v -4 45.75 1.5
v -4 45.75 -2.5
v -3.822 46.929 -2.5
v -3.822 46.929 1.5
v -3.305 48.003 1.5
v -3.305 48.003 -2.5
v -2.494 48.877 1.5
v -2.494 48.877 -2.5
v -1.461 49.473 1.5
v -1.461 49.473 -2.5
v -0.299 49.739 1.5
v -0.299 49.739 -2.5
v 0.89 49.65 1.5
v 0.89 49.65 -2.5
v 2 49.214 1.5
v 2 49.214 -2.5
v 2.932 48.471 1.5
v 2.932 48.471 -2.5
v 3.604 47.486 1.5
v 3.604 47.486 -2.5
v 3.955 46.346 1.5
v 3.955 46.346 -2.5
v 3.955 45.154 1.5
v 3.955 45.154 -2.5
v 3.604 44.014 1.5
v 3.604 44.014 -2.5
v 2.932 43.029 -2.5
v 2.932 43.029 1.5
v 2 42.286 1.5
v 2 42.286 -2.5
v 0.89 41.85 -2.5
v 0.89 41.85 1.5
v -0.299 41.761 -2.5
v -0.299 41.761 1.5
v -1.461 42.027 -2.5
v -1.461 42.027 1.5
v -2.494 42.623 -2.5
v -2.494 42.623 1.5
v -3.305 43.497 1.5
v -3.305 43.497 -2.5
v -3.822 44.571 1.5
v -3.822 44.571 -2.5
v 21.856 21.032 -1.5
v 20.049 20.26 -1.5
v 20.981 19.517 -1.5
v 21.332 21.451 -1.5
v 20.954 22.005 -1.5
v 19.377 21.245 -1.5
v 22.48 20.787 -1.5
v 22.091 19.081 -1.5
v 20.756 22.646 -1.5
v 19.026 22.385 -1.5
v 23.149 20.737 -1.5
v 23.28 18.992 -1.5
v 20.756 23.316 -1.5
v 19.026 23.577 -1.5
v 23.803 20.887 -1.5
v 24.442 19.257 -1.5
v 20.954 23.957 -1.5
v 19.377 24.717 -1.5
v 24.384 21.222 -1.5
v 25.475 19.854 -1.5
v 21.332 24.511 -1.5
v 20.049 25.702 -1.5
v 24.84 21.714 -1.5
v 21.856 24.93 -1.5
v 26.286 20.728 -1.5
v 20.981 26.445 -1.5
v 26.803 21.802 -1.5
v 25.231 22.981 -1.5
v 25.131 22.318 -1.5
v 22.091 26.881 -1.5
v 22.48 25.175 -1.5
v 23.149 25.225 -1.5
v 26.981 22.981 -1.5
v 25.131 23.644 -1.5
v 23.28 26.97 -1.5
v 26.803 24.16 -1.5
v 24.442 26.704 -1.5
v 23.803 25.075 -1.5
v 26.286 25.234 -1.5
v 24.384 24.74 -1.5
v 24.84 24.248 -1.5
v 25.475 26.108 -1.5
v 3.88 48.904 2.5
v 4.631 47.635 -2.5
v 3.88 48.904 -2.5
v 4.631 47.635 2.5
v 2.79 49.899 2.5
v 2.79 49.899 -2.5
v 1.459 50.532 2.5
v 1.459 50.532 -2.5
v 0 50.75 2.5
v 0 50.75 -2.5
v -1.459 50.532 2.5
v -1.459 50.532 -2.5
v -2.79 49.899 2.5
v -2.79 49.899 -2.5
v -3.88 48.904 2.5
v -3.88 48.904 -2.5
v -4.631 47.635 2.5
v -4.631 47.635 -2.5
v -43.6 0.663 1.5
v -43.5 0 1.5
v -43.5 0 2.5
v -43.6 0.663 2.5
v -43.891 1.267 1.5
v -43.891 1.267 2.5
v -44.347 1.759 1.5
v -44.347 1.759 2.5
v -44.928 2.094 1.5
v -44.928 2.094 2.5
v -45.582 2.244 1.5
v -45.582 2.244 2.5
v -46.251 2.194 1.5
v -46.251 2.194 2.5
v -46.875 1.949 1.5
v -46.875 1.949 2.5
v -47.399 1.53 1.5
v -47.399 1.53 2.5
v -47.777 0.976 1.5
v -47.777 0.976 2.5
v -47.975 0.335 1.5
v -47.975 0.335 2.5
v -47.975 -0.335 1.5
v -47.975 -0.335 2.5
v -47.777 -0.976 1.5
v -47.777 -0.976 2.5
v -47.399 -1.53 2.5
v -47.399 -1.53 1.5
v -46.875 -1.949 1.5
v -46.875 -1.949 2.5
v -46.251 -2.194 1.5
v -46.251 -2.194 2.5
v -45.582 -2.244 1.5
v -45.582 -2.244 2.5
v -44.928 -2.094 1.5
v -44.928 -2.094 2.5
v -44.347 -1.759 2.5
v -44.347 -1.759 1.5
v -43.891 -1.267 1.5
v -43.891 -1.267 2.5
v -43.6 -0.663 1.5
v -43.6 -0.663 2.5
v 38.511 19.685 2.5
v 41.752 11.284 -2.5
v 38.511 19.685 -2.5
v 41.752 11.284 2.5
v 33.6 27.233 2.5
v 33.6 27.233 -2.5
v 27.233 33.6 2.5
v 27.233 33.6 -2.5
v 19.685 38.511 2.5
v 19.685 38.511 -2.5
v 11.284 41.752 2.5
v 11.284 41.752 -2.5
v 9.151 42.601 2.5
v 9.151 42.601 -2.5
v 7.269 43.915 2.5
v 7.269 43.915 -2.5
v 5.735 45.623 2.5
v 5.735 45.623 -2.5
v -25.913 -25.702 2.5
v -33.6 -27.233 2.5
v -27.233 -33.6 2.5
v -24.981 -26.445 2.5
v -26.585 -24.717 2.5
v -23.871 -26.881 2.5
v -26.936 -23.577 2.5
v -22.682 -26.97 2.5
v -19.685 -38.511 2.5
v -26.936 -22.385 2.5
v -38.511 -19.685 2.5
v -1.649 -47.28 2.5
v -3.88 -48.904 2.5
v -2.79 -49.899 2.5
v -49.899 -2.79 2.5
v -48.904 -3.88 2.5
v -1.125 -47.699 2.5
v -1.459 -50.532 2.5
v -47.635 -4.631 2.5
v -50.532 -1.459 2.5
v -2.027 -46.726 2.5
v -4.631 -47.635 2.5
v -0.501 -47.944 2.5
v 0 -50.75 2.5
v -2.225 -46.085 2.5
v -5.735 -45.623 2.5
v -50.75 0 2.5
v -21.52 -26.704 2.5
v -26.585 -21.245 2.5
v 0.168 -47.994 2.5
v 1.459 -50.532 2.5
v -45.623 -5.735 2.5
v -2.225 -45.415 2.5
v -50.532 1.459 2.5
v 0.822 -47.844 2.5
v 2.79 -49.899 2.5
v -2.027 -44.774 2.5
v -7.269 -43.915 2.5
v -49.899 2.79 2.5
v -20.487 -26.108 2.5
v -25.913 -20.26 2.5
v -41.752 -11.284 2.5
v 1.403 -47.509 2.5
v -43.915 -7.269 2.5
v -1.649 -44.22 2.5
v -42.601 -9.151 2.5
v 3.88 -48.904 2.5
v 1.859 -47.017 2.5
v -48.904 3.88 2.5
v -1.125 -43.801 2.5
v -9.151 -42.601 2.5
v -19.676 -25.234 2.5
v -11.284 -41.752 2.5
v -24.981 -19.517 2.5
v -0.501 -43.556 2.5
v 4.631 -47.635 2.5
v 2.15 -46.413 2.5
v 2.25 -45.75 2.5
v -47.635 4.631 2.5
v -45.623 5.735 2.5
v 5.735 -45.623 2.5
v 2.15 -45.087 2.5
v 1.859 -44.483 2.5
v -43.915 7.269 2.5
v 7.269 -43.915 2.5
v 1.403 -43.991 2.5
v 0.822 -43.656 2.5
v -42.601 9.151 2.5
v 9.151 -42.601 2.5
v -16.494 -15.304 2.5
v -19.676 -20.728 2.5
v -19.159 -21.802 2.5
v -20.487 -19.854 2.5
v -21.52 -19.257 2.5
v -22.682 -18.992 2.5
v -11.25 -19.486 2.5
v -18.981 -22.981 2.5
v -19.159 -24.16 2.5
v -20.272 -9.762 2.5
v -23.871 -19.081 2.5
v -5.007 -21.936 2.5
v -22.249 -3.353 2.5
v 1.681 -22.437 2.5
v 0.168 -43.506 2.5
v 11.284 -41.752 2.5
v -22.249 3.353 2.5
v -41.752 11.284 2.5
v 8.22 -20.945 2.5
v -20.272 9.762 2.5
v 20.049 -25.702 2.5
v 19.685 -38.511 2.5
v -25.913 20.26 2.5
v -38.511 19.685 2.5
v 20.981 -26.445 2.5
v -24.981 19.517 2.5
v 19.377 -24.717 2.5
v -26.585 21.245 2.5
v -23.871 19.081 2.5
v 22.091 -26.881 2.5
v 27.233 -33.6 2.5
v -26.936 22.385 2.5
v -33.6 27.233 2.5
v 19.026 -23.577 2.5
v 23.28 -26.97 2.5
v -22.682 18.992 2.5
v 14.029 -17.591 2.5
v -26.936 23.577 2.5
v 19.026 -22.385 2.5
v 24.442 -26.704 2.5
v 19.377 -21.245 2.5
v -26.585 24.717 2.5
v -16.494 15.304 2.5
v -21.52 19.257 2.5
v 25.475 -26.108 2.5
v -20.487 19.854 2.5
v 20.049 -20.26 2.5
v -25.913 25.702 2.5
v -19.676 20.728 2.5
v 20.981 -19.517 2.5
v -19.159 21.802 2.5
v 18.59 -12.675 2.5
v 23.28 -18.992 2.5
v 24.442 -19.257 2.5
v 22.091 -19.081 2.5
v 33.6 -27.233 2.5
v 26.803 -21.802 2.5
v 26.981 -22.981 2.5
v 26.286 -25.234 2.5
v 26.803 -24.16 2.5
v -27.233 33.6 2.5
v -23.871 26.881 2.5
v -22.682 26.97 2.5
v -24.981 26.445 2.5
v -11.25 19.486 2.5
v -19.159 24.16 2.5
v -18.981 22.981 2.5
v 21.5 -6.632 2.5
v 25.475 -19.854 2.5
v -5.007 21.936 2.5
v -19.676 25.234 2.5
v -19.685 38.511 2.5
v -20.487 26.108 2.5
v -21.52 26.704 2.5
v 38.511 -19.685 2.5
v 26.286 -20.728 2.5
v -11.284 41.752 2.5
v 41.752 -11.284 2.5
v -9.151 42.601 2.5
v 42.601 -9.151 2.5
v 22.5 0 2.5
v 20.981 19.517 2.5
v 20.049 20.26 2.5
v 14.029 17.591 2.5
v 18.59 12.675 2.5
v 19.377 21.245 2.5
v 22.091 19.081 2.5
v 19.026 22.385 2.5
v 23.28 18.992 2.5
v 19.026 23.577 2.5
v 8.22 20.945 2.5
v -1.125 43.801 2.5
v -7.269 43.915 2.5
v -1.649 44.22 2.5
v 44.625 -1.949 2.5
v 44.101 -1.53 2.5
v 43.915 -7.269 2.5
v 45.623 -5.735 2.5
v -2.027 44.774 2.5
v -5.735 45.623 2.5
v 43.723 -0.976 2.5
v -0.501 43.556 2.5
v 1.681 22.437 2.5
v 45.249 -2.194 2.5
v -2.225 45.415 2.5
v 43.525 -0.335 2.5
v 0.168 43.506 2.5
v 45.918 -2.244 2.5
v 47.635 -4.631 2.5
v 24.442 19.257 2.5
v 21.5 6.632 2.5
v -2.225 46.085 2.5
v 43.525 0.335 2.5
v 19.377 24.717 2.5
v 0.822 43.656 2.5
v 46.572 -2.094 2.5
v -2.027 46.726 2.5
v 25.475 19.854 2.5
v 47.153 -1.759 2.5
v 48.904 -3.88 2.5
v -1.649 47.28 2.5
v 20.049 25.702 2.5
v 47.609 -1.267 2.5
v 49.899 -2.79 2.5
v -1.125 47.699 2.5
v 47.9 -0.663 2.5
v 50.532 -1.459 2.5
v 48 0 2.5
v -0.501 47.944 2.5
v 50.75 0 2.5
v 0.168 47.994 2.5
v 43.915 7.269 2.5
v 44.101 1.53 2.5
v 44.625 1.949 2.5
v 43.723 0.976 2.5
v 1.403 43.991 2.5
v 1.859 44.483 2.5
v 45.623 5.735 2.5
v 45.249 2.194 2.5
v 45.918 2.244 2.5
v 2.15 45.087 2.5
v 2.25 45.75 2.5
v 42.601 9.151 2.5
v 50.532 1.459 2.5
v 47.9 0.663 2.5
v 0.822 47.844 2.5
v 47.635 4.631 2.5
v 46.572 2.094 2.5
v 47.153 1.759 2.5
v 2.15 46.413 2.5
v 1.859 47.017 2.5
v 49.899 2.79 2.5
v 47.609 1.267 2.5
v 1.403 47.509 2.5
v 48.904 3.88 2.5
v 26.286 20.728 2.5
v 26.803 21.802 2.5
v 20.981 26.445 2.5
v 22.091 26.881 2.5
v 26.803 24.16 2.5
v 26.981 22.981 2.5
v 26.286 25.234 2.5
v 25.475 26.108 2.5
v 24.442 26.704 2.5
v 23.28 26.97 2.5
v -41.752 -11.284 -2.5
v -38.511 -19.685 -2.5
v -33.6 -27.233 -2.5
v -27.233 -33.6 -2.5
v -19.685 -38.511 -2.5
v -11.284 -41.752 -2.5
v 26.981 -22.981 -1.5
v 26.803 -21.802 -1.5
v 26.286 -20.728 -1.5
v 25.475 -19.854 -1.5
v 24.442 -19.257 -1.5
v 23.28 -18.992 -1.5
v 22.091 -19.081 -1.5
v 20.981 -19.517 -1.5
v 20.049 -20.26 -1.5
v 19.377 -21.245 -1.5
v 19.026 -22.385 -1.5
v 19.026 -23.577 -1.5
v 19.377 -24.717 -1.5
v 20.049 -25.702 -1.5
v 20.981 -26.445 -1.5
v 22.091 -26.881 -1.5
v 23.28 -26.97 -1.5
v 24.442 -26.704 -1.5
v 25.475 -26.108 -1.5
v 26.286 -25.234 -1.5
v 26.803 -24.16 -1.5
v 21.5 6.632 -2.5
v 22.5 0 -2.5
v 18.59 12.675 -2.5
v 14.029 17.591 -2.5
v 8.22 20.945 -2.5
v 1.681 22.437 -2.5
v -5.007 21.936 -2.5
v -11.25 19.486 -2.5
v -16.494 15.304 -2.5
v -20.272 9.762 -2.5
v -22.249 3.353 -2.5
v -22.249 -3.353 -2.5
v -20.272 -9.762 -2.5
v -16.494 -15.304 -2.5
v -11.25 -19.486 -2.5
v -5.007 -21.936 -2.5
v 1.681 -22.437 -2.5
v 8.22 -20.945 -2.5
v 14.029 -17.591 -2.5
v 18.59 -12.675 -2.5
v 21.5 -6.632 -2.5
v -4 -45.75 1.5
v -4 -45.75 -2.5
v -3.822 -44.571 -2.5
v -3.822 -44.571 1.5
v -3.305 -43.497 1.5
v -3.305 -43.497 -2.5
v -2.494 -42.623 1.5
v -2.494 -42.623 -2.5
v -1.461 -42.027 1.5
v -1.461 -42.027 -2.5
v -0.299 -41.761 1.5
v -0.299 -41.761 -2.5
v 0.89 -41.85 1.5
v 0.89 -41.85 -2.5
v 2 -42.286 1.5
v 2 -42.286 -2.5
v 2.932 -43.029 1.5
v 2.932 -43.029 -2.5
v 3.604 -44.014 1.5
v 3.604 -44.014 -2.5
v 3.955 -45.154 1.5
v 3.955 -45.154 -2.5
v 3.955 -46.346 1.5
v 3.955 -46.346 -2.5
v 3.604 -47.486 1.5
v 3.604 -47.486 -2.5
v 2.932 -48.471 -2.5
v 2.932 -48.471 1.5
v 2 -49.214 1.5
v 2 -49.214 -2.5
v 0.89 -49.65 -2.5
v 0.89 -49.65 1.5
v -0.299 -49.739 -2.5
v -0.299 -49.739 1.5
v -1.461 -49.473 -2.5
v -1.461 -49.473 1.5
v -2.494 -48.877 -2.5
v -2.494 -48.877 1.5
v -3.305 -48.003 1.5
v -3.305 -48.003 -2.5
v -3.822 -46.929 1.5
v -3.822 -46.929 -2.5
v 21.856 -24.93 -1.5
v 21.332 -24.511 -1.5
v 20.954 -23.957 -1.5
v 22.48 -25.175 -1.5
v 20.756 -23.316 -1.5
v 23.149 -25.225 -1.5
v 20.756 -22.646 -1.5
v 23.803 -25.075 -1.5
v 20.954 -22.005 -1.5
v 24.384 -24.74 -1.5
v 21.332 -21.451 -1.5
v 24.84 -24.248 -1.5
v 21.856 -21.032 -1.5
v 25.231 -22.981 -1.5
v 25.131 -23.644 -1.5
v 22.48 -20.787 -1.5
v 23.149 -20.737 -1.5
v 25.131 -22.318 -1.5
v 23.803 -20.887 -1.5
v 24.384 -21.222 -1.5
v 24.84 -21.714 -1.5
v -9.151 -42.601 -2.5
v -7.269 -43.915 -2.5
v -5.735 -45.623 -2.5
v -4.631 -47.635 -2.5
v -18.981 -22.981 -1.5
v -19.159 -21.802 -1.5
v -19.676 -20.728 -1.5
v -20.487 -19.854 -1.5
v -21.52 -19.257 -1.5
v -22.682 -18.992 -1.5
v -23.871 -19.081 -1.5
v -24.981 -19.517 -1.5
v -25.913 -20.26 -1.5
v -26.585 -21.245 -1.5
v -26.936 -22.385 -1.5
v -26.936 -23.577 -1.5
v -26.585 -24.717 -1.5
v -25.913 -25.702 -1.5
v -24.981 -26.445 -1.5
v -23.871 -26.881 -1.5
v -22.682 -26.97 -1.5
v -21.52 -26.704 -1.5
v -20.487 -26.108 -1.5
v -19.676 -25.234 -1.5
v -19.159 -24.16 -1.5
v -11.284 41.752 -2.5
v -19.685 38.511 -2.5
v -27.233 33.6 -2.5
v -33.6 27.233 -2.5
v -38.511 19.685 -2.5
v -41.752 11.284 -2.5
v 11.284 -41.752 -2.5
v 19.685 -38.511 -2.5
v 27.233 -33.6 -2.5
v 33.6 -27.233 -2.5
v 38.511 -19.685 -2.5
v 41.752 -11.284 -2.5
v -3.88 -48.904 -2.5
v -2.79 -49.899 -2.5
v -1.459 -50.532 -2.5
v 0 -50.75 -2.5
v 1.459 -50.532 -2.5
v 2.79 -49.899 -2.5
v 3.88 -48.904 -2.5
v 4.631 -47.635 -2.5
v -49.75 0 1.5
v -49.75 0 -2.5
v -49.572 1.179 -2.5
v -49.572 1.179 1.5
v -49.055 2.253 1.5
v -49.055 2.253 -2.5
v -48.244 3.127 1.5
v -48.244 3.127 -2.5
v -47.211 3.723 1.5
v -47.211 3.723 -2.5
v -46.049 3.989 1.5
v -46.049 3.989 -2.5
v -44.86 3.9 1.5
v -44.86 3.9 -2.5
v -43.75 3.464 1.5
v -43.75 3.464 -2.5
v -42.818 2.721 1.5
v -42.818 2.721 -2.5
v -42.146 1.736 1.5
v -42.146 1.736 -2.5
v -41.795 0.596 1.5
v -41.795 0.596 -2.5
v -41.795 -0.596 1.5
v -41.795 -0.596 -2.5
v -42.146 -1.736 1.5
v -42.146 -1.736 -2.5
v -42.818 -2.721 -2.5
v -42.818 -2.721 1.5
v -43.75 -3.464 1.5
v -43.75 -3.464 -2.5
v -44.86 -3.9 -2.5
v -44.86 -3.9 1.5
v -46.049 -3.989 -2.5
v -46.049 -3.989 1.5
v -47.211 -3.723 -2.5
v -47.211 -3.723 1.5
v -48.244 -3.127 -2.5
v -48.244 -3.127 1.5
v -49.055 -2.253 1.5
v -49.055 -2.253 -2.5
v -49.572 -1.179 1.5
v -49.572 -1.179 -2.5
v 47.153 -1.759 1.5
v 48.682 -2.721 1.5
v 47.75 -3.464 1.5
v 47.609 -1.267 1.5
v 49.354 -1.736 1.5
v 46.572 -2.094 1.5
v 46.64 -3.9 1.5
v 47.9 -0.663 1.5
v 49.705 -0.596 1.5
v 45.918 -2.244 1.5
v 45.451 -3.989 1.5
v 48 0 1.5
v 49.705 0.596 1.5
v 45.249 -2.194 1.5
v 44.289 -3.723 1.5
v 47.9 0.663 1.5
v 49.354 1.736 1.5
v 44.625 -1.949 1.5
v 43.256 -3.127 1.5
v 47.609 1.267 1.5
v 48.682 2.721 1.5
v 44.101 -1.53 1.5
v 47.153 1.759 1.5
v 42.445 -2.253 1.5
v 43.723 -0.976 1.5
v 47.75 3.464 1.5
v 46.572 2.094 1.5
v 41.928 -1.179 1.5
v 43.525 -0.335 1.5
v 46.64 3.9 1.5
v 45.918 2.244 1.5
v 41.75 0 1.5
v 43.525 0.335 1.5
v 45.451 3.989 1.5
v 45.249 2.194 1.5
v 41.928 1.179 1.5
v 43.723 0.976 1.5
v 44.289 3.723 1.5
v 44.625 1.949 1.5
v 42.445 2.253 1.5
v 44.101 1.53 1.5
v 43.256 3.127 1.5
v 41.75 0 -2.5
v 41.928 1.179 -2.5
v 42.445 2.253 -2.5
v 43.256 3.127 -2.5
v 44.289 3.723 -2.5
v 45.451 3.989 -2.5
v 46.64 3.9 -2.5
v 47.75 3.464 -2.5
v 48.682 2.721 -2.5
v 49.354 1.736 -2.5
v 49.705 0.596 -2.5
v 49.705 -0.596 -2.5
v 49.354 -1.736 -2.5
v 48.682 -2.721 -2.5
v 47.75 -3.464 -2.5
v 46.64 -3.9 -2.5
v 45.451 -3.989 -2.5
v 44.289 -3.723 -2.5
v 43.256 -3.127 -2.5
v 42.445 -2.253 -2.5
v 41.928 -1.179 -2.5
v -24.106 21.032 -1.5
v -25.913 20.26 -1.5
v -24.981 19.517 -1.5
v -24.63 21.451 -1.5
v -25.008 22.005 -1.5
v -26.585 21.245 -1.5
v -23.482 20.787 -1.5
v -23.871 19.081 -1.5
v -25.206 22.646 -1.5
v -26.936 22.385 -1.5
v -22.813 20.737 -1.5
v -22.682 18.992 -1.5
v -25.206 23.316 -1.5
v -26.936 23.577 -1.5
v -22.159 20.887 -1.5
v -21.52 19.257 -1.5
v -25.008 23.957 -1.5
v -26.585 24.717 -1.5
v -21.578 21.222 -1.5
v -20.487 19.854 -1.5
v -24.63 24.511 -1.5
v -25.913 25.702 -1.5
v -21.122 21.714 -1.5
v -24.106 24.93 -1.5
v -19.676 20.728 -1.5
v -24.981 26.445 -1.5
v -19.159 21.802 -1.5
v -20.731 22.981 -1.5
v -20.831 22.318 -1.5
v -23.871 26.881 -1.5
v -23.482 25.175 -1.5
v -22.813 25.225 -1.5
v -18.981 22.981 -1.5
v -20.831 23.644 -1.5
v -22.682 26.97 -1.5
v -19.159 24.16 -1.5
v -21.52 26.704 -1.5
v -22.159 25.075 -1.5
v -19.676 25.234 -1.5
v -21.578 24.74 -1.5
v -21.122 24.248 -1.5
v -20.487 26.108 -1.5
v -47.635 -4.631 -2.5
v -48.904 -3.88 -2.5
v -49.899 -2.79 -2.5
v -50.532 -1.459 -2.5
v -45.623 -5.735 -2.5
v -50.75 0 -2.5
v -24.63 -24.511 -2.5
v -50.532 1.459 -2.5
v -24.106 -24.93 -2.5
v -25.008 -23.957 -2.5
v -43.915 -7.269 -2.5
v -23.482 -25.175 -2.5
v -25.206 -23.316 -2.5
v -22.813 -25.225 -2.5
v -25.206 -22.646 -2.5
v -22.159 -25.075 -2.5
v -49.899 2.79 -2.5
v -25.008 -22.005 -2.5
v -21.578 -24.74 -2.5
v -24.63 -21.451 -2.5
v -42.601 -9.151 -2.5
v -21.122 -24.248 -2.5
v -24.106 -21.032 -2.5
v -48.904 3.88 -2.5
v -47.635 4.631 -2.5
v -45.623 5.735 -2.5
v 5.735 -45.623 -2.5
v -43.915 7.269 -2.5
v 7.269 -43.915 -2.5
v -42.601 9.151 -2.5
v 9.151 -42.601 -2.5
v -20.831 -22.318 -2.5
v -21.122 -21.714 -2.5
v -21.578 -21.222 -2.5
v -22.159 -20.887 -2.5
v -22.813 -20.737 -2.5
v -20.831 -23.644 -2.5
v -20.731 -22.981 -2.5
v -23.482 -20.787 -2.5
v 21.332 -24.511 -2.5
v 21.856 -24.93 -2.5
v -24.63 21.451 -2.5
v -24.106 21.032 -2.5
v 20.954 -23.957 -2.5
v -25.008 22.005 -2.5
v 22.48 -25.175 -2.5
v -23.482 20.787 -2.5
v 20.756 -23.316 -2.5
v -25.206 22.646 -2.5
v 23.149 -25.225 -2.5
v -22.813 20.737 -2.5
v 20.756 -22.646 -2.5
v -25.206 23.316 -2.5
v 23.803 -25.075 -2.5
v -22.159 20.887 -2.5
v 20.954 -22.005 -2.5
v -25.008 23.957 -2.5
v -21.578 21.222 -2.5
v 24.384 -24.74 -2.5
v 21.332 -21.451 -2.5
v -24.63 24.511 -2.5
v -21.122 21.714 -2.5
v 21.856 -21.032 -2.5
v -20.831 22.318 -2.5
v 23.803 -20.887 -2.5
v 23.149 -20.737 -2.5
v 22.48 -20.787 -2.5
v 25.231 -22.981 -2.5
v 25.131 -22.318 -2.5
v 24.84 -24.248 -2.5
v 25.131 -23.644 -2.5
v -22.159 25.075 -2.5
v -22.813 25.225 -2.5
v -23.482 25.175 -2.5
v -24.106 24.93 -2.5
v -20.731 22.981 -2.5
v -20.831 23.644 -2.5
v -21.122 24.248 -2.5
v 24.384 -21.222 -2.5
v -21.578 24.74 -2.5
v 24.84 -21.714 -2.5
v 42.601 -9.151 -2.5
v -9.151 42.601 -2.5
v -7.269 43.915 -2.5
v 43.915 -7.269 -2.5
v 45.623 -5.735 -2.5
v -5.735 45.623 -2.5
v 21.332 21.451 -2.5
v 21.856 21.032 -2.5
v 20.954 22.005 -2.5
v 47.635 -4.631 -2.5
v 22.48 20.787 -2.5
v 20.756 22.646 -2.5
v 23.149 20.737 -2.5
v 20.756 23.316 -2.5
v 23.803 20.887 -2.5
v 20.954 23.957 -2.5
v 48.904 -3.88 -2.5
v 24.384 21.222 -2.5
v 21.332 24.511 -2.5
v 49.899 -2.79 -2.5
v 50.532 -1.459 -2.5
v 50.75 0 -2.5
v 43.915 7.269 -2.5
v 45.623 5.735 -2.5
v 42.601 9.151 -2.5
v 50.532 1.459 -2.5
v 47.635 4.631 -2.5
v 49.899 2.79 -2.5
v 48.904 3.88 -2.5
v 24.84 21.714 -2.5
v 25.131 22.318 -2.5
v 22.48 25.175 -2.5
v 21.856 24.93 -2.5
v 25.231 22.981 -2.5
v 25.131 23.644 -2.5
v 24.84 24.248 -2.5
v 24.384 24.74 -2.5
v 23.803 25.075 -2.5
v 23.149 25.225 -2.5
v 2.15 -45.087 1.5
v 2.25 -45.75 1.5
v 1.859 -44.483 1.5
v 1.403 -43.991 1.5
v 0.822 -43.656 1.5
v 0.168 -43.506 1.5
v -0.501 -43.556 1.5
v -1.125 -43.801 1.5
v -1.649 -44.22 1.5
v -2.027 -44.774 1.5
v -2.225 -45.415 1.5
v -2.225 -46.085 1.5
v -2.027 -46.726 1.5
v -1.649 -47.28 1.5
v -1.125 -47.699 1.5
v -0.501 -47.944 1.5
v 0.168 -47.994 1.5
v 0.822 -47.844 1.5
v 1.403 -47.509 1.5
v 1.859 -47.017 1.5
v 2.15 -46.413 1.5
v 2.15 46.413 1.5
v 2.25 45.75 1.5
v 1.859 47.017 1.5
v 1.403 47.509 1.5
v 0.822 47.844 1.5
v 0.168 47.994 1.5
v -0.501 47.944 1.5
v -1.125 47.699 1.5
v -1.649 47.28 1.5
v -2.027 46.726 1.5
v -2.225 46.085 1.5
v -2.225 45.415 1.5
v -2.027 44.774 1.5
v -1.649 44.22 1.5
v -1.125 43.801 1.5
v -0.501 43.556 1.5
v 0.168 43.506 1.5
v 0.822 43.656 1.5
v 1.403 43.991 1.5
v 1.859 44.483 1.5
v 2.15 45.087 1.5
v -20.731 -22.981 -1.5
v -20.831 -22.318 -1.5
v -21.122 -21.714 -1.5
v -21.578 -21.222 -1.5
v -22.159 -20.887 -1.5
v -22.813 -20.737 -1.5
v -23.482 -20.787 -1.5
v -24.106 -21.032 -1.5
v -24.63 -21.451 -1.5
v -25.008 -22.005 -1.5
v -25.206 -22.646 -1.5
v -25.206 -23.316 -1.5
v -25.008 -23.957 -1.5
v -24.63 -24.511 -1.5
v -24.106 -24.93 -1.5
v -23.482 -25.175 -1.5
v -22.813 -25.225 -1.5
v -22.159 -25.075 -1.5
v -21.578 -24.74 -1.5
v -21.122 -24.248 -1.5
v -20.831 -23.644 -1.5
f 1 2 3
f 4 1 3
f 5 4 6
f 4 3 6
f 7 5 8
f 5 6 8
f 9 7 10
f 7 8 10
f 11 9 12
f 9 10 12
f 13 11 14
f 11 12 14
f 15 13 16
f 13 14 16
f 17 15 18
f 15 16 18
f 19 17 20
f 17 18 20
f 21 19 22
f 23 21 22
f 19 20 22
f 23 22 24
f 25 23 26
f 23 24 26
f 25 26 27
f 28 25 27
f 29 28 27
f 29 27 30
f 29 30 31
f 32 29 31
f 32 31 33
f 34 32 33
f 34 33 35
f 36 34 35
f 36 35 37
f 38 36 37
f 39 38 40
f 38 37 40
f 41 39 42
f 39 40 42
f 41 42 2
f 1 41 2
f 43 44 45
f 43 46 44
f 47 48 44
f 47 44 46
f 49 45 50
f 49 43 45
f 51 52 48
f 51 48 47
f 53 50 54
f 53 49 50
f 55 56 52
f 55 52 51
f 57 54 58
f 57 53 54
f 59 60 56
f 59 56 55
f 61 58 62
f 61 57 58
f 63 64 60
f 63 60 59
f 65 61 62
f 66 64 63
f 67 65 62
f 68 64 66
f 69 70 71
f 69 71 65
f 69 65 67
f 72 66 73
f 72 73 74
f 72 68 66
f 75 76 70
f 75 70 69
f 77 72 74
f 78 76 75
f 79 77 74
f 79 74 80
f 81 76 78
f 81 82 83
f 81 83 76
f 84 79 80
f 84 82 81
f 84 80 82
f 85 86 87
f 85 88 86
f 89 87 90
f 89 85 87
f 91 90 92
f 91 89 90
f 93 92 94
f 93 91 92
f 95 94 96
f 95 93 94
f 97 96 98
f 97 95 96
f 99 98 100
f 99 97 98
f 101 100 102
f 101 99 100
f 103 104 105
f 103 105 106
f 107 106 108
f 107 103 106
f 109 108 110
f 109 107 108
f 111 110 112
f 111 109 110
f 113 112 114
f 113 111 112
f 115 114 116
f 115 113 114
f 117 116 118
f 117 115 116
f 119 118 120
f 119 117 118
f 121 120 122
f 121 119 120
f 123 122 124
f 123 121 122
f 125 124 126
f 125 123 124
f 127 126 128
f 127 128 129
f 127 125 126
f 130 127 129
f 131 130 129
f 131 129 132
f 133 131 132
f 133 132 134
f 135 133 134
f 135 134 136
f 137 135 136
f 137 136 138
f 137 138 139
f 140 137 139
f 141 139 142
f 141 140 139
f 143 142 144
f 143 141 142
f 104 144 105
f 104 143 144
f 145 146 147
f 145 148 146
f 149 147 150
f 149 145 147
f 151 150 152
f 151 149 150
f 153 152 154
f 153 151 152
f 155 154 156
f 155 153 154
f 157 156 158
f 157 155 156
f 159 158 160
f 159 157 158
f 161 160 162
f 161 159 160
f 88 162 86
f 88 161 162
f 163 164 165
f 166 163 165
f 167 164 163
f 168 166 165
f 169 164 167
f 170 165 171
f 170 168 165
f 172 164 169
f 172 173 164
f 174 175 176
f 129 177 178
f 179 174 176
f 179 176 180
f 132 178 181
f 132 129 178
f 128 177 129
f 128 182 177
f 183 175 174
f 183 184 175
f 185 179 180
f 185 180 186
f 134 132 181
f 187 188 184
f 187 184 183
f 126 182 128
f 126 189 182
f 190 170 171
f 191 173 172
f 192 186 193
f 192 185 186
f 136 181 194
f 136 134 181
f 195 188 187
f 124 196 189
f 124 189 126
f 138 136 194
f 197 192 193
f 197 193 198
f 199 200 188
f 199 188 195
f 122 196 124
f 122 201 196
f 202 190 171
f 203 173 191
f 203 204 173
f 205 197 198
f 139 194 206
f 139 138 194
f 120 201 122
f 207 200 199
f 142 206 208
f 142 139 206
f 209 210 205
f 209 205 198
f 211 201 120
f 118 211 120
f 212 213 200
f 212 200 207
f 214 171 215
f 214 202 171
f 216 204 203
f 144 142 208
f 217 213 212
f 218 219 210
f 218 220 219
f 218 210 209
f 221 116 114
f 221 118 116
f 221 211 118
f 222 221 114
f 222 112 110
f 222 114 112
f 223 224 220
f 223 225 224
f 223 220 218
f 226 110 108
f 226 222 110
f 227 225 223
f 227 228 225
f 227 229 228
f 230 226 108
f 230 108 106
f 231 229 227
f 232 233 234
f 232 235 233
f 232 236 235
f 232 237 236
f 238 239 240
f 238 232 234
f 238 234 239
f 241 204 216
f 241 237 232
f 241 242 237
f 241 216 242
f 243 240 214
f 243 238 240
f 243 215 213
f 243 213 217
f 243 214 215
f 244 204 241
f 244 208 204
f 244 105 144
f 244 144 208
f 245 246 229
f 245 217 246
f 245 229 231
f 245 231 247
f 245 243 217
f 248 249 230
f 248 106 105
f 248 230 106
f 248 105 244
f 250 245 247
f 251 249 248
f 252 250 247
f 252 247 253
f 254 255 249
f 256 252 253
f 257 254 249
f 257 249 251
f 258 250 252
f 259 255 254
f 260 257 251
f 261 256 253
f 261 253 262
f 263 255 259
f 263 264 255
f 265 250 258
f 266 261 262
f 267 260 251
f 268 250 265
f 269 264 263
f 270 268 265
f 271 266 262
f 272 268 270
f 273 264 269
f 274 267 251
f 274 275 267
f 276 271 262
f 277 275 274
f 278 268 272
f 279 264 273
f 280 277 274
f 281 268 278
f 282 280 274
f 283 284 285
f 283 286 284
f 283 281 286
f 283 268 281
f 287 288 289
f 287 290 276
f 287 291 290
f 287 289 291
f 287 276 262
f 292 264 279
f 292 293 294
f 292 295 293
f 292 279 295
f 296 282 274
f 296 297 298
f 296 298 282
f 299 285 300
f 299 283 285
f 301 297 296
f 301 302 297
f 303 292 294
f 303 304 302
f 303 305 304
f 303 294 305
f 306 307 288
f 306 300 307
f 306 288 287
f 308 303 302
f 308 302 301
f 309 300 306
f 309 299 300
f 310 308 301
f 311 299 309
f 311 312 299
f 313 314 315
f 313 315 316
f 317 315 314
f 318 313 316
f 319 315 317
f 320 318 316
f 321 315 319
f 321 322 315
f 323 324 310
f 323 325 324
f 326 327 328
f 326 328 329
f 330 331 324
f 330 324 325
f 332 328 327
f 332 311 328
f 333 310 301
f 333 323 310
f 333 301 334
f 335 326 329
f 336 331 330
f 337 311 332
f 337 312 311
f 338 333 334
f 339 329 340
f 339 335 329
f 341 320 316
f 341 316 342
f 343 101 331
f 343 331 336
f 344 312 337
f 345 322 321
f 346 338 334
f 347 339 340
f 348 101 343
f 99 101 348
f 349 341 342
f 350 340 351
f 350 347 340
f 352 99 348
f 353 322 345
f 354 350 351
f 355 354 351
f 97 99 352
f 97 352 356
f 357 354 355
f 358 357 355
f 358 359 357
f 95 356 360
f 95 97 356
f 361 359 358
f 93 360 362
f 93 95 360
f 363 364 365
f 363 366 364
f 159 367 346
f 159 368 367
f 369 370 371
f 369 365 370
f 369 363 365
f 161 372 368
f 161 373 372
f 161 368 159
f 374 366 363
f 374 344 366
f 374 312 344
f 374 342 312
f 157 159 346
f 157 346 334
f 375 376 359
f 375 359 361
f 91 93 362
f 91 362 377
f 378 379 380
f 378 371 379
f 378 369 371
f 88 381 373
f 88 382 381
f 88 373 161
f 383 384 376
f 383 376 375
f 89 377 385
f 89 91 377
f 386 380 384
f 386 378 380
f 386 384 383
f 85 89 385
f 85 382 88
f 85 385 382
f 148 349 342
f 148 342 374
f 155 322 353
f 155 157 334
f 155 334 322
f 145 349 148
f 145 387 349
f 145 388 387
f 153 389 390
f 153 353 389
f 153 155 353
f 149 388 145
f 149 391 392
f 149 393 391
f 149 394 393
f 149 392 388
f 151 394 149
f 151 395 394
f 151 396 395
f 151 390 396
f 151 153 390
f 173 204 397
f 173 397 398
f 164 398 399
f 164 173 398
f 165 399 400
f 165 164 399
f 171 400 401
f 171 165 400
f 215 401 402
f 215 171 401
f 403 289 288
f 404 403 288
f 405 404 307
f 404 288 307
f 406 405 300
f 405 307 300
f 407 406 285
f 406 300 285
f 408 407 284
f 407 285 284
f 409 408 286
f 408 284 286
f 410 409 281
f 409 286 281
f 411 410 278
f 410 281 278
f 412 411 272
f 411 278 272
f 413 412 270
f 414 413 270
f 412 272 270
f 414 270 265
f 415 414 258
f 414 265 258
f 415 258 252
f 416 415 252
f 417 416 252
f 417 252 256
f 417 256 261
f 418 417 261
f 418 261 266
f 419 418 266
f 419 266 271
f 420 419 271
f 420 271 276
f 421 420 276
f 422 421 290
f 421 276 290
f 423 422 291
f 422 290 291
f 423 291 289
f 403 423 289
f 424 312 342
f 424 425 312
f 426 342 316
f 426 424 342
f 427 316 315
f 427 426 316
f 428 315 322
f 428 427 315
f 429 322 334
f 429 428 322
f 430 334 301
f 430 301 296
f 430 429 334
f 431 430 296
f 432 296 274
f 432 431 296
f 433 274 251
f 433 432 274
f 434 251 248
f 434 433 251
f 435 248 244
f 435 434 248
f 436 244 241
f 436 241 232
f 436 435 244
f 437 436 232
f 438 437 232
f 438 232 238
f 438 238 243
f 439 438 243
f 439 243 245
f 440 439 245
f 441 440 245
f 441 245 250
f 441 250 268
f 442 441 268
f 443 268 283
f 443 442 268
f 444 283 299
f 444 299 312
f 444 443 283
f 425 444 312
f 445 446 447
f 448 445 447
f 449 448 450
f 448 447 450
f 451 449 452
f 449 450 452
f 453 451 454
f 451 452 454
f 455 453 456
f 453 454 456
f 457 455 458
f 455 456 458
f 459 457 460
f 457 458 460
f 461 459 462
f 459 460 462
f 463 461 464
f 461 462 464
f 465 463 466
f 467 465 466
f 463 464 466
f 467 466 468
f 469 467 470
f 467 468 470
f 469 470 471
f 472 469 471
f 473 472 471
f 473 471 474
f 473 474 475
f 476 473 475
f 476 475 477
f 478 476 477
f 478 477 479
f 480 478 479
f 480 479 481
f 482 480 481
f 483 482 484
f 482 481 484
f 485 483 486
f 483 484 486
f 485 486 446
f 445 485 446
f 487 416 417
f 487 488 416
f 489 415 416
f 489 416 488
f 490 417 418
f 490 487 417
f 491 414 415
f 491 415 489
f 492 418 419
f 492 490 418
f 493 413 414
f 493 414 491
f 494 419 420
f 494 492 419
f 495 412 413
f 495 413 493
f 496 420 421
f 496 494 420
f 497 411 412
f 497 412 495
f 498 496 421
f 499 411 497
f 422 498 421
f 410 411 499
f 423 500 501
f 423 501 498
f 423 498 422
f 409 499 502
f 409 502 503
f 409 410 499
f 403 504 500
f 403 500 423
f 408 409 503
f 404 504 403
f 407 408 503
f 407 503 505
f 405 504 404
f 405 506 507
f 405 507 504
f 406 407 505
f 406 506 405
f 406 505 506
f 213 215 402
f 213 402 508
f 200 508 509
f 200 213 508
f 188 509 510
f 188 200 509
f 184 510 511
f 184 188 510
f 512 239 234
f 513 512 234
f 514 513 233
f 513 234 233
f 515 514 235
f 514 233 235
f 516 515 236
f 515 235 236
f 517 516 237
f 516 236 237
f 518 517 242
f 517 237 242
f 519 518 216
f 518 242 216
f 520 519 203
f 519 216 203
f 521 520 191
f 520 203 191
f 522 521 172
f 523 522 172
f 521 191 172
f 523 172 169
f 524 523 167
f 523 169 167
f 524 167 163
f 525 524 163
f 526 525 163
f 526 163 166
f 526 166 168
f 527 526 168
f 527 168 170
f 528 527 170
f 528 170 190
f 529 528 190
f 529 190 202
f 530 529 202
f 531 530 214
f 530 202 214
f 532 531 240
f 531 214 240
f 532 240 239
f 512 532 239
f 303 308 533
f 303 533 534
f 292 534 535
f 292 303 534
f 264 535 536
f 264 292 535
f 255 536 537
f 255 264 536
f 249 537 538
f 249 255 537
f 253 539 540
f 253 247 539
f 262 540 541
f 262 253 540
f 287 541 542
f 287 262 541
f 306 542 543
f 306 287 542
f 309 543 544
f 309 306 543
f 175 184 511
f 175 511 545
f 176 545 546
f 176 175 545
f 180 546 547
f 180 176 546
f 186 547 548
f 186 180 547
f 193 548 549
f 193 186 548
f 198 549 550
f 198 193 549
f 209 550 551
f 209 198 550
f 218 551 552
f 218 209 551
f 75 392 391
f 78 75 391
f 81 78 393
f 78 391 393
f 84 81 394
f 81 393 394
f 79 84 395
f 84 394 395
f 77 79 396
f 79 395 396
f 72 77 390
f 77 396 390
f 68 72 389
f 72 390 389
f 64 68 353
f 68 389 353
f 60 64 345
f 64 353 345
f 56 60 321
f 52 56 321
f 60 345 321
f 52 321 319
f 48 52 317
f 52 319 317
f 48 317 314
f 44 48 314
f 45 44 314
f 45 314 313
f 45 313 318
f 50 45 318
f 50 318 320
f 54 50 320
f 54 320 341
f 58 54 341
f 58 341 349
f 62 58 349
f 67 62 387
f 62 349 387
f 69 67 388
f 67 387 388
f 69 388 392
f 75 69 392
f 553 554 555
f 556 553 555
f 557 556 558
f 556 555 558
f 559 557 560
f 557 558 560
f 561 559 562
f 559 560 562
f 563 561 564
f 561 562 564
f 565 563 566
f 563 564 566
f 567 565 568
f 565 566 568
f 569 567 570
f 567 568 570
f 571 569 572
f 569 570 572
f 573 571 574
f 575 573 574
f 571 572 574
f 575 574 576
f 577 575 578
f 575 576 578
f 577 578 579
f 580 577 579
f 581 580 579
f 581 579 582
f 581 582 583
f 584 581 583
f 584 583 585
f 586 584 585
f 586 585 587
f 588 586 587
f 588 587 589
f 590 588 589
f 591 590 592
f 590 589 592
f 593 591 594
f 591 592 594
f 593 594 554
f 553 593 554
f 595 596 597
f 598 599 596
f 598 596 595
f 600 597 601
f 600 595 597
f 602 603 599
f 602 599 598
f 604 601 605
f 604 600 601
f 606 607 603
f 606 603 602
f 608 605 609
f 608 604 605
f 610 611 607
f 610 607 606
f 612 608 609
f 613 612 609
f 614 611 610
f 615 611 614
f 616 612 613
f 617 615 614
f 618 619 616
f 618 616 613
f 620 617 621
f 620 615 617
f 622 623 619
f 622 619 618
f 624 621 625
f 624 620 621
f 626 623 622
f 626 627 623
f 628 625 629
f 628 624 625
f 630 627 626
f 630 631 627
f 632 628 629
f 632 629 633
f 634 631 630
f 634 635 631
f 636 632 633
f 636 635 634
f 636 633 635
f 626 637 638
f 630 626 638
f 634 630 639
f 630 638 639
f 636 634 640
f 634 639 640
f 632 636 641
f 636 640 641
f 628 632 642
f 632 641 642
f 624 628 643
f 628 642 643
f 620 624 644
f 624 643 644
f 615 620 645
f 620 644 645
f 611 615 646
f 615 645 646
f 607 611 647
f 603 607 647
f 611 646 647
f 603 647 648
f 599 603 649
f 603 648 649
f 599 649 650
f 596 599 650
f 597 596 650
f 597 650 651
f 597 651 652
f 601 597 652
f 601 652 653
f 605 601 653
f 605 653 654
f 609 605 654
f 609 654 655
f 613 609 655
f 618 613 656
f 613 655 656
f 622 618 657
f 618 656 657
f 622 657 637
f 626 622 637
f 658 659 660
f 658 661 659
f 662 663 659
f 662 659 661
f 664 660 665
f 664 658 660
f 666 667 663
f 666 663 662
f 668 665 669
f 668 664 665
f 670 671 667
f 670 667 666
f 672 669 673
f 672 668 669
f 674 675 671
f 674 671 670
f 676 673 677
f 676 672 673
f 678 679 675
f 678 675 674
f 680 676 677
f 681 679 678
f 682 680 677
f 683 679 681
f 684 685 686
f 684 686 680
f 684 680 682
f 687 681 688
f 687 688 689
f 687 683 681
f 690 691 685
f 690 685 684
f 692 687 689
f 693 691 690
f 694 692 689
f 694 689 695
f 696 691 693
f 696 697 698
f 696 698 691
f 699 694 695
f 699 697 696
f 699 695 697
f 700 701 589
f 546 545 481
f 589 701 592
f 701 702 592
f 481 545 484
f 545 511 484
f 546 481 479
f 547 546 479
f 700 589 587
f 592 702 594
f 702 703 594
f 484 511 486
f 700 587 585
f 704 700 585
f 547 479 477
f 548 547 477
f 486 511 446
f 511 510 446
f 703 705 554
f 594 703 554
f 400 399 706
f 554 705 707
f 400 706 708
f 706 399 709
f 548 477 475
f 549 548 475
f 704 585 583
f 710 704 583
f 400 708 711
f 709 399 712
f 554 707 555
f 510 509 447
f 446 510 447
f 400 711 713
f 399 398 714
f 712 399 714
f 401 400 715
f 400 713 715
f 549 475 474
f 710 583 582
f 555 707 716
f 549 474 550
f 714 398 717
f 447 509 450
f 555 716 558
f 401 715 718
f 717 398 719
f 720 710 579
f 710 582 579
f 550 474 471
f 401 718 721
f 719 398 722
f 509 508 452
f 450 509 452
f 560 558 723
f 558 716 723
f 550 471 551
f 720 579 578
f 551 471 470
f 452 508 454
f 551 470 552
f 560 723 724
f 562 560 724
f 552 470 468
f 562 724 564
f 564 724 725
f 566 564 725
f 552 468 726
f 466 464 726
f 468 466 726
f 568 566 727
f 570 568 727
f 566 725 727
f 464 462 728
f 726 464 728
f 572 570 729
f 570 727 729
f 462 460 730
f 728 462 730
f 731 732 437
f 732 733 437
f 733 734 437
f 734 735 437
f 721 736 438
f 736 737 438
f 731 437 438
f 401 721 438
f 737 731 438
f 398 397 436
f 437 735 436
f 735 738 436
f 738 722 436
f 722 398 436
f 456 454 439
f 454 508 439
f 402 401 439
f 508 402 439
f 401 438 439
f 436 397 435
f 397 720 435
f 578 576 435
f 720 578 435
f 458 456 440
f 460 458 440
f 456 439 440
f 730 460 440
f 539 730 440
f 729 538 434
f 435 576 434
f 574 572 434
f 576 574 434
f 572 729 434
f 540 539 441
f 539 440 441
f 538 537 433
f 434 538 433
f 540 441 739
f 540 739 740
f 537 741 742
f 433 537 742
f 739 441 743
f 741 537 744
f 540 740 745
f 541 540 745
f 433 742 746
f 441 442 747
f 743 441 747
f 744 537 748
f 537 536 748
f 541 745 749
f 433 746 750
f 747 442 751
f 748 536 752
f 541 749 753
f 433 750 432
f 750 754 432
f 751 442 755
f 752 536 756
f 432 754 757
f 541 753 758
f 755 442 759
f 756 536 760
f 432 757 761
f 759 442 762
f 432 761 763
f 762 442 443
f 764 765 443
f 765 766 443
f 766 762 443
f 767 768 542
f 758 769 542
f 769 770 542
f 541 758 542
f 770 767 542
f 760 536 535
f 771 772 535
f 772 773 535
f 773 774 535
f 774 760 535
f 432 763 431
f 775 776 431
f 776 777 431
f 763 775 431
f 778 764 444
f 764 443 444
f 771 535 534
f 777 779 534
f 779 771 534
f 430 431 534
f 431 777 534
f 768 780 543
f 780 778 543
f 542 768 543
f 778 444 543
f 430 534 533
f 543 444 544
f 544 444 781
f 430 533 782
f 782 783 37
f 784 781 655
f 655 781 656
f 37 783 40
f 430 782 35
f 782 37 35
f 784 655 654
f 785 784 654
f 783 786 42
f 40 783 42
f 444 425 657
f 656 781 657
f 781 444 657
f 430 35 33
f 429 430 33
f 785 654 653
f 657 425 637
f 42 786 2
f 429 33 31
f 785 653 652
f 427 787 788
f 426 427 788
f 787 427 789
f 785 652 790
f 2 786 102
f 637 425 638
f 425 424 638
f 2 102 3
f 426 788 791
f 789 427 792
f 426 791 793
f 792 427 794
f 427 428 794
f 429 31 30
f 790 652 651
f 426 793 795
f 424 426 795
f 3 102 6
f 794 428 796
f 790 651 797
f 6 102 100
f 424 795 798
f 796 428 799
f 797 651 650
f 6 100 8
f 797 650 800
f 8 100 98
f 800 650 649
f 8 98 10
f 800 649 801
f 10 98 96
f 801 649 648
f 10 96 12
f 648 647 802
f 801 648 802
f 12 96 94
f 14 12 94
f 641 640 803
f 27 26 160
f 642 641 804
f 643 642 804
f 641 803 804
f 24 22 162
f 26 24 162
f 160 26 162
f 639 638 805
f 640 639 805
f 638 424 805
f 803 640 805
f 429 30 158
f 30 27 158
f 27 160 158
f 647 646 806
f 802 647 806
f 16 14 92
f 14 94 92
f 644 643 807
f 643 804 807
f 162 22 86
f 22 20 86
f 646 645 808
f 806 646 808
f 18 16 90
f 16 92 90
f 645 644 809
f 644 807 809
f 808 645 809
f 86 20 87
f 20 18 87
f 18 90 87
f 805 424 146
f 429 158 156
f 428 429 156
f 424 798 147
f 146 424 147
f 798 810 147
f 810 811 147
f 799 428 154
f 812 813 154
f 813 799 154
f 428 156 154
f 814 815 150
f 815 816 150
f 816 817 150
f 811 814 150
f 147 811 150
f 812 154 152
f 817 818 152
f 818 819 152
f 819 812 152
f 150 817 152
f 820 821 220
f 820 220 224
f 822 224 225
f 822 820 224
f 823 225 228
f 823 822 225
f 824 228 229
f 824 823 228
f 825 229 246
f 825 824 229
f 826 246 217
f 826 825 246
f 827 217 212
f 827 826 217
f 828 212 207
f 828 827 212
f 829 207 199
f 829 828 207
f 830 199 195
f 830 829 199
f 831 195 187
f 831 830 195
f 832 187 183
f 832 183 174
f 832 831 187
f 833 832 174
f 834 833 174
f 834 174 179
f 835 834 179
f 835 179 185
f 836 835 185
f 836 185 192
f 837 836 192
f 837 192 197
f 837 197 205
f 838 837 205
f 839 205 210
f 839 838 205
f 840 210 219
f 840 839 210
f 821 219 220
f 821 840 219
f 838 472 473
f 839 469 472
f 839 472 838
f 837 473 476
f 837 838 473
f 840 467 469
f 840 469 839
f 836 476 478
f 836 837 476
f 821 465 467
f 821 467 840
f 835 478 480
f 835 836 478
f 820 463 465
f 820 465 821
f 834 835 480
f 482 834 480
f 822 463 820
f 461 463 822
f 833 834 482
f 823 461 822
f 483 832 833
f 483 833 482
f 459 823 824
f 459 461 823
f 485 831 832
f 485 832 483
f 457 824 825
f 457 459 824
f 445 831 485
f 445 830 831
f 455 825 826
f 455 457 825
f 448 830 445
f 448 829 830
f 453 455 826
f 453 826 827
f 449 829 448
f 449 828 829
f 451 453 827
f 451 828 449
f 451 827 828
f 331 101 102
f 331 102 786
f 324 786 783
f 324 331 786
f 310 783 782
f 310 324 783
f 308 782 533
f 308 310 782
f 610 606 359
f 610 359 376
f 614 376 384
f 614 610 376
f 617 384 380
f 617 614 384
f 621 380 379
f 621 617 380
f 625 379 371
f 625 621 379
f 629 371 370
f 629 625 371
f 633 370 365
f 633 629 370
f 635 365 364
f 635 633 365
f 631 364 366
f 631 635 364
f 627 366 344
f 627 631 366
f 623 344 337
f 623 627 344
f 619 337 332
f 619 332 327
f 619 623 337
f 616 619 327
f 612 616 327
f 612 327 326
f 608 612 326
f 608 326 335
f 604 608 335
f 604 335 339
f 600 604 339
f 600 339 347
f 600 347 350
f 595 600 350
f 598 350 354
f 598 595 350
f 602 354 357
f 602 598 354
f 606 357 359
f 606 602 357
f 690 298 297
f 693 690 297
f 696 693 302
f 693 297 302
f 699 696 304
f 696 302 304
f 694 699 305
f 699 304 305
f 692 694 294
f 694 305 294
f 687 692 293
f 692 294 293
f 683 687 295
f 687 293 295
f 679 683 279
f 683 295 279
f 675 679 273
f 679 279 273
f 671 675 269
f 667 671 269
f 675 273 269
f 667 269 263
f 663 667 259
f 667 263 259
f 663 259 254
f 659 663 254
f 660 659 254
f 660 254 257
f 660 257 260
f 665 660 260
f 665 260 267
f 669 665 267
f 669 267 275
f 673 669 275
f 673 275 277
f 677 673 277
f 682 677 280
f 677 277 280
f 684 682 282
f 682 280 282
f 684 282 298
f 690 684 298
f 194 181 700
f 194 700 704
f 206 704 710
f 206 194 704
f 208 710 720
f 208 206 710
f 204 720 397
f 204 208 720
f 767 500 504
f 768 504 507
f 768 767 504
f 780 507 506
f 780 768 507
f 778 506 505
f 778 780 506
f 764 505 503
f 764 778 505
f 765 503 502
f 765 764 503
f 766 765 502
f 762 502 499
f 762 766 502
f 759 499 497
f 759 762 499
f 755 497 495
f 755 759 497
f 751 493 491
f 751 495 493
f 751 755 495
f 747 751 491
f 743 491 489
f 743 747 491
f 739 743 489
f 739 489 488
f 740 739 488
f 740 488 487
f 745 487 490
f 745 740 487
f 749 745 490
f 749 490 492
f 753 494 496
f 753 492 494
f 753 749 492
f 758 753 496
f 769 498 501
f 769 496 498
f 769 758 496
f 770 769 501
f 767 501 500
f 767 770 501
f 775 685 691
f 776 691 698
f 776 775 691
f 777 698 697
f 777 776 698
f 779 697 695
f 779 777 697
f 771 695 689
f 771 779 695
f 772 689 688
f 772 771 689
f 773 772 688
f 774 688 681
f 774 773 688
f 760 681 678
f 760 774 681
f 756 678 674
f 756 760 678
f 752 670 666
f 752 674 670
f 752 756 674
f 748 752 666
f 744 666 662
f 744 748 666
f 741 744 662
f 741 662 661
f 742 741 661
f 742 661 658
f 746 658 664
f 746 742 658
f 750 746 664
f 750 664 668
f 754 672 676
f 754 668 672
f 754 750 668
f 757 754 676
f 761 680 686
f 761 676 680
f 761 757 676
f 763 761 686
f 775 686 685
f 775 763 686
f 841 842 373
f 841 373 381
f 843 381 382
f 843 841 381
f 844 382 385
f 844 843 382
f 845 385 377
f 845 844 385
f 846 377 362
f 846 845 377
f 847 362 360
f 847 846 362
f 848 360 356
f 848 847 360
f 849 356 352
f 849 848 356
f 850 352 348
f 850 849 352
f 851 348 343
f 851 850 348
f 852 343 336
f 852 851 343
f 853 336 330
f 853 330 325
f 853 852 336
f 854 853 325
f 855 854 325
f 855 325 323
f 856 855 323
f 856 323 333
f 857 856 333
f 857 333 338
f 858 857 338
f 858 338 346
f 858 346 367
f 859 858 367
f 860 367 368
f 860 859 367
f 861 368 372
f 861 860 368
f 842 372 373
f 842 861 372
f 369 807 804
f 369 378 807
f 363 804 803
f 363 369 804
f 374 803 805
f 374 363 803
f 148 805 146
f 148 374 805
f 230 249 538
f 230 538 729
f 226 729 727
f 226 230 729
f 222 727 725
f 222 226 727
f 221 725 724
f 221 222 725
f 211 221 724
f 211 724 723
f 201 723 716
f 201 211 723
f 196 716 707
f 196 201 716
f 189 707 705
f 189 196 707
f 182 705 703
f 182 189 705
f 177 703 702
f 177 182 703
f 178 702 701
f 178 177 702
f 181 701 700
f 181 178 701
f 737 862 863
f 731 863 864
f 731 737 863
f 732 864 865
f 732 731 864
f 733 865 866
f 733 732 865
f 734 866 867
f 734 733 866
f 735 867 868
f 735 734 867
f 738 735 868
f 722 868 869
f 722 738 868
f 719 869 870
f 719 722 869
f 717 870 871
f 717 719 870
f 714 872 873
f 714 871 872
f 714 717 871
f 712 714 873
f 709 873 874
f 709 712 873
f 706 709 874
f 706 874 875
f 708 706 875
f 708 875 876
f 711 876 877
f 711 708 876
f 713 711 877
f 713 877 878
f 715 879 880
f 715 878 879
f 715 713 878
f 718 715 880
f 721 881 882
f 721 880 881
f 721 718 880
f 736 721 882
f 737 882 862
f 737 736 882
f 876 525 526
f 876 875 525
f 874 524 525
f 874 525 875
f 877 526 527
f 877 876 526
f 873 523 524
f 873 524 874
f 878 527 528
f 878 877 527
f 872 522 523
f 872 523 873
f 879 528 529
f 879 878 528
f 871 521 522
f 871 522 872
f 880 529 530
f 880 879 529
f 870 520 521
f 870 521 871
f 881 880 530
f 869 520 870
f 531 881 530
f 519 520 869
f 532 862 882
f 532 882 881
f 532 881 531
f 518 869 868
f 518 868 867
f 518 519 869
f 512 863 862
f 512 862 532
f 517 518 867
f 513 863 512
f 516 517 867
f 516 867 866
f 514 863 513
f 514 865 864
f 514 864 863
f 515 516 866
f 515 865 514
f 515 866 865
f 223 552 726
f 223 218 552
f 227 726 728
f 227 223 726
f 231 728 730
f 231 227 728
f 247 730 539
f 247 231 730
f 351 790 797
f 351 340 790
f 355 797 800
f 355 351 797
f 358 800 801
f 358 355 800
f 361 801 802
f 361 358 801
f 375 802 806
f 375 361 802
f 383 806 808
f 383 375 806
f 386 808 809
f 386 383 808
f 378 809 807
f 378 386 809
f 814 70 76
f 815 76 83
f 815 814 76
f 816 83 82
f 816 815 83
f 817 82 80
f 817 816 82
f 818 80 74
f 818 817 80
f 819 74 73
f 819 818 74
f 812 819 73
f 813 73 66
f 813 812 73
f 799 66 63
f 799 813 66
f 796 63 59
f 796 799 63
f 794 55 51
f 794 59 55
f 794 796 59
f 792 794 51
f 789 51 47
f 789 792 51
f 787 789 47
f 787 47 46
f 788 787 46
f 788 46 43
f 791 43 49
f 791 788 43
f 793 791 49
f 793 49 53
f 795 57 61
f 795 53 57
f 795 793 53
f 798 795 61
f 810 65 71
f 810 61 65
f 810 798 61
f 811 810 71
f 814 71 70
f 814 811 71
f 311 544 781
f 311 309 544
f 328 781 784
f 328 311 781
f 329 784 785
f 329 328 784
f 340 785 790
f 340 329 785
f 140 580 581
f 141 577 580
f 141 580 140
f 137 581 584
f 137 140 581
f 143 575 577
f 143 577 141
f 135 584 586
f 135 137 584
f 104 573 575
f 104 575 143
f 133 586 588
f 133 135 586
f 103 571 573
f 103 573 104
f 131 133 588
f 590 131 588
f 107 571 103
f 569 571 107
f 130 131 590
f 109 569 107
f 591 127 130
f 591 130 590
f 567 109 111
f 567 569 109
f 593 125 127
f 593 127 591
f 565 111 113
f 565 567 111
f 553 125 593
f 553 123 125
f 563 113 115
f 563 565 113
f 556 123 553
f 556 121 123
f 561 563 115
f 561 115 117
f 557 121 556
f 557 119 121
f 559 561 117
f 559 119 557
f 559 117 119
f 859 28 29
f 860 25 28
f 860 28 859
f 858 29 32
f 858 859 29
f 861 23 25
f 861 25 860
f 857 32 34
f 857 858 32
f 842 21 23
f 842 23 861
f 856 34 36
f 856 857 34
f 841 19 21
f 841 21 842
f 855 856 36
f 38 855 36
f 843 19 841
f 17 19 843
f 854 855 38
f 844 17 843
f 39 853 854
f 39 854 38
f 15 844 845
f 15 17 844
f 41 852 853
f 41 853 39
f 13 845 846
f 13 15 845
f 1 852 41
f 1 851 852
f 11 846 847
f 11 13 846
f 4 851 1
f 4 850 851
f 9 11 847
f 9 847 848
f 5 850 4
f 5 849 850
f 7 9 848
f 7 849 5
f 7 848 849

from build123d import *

# Parameters (mm, degrees)
SKETCH1_R           = 2.25
SKETCH1_R_2         = 22.5
BOSS_EXTRUDE1_DEPTH = 2.5
SKETCH3_R           = 4
CUT_EXTRUDE2_DEPTH  = 4
SKETCH4_R           = 4
CUT_EXTRUDE3_DEPTH  = 4


with BuildPart() as part:
    # Sketch1 → Boss-Extrude1 (new, symmetric)
    with BuildSketch(Plane.XY):
        with BuildLine():
            ThreePointArc((4.630966194, 47.635245902), (0, 50.75), (-4.630966194, 47.635245902))
            ThreePointArc((-4.630966194, 47.635245902), (-7.268500835, 43.914585958), (-11.283903543, 41.752078042))
            ThreePointArc((-11.283903543, 41.752078042), (-30.582368286, 30.582368286), (-41.752078042, 11.283903543))
            ThreePointArc((-41.752078042, 11.283903543), (-43.914585958, 7.268500835), (-47.635245902, 4.630966194))
            ThreePointArc((-47.635245902, 4.630966194), (-50.75, 0), (-47.635245902, -4.630966194))
            ThreePointArc((-47.635245902, -4.630966194), (-43.914585958, -7.268500835), (-41.752078042, -11.283903543))
            ThreePointArc((-41.752078042, -11.283903543), (-30.582368286, -30.582368286), (-11.283903543, -41.752078042))
            ThreePointArc((-11.283903543, -41.752078042), (-7.268500835, -43.914585958), (-4.630966194, -47.635245902))
            ThreePointArc((-4.630966194, -47.635245902), (0, -50.75), (4.630966194, -47.635245902))
            ThreePointArc((4.630966194, -47.635245902), (7.268500835, -43.914585958), (11.283903543, -41.752078042))
            ThreePointArc((11.283903543, -41.752078042), (30.582368286, -30.582368286), (41.752078042, -11.283903543))
            ThreePointArc((41.752078042, -11.283903543), (43.914585958, -7.268500835), (47.635245902, -4.630966194))
            ThreePointArc((47.635245902, -4.630966194), (50.75, 0), (47.635245902, 4.630966194))
            ThreePointArc((47.635245902, 4.630966194), (43.914585958, 7.268500835), (41.752078042, 11.283903543))
            ThreePointArc((41.752078042, 11.283903543), (30.582368286, 30.582368286), (11.283903543, 41.752078042))
            ThreePointArc((11.283903543, 41.752078042), (7.268500835, 43.914585958), (4.630966194, 47.635245902))
        make_face()
        with Locations((-45.75, 0)):
            Circle(SKETCH1_R, mode=Mode.SUBTRACT)
        with Locations((0, 45.75)):
            Circle(SKETCH1_R, mode=Mode.SUBTRACT)
        with Locations((45.75, 0)):
            Circle(SKETCH1_R, mode=Mode.SUBTRACT)
        with Locations((0, -45.75)):
            Circle(SKETCH1_R, mode=Mode.SUBTRACT)
        with Locations((-22.980970389, 22.980970389)):
            Circle(SKETCH1_R, mode=Mode.SUBTRACT)
        with Locations((22.980970389, 22.980970389)):
            Circle(SKETCH1_R, mode=Mode.SUBTRACT)
        with Locations((22.980970389, -22.980970389)):
            Circle(SKETCH1_R, mode=Mode.SUBTRACT)
        with Locations((-22.980970389, -22.980970389)):
            Circle(SKETCH1_R, mode=Mode.SUBTRACT)
        Circle(SKETCH1_R_2, mode=Mode.SUBTRACT)
    extrude(amount=BOSS_EXTRUDE1_DEPTH, both=True)

    # Sketch3 → Cut-Extrude2 (cut)
    with BuildSketch(Plane.XY.offset(2.5)):
        with Locations((-22.980970389, -22.980970389)):
            Circle(SKETCH3_R)
        with Locations((-22.980970389, 22.980970389)):
            Circle(SKETCH3_R)
        with Locations((22.980970389, 22.980970389)):
            Circle(SKETCH3_R)
        with Locations((22.980970389, -22.980970389)):
            Circle(SKETCH3_R)
    extrude(amount=-CUT_EXTRUDE2_DEPTH, mode=Mode.SUBTRACT)

    # Sketch4 → Cut-Extrude3 (cut)
    with BuildSketch(Plane(origin=(0, 0, -2.5), x_dir=(-1, 0, 0), z_dir=(0, 0, -1))):
        with Locations((0, 45.75)):
            Circle(SKETCH4_R)
        with Locations((45.75, 0)):
            Circle(SKETCH4_R)
        with Locations((0, -45.75)):
            Circle(SKETCH4_R)
        with Locations((-45.75, 0)):
            Circle(SKETCH4_R)
    extrude(amount=-CUT_EXTRUDE3_DEPTH, mode=Mode.SUBTRACT)


solid = part.part
